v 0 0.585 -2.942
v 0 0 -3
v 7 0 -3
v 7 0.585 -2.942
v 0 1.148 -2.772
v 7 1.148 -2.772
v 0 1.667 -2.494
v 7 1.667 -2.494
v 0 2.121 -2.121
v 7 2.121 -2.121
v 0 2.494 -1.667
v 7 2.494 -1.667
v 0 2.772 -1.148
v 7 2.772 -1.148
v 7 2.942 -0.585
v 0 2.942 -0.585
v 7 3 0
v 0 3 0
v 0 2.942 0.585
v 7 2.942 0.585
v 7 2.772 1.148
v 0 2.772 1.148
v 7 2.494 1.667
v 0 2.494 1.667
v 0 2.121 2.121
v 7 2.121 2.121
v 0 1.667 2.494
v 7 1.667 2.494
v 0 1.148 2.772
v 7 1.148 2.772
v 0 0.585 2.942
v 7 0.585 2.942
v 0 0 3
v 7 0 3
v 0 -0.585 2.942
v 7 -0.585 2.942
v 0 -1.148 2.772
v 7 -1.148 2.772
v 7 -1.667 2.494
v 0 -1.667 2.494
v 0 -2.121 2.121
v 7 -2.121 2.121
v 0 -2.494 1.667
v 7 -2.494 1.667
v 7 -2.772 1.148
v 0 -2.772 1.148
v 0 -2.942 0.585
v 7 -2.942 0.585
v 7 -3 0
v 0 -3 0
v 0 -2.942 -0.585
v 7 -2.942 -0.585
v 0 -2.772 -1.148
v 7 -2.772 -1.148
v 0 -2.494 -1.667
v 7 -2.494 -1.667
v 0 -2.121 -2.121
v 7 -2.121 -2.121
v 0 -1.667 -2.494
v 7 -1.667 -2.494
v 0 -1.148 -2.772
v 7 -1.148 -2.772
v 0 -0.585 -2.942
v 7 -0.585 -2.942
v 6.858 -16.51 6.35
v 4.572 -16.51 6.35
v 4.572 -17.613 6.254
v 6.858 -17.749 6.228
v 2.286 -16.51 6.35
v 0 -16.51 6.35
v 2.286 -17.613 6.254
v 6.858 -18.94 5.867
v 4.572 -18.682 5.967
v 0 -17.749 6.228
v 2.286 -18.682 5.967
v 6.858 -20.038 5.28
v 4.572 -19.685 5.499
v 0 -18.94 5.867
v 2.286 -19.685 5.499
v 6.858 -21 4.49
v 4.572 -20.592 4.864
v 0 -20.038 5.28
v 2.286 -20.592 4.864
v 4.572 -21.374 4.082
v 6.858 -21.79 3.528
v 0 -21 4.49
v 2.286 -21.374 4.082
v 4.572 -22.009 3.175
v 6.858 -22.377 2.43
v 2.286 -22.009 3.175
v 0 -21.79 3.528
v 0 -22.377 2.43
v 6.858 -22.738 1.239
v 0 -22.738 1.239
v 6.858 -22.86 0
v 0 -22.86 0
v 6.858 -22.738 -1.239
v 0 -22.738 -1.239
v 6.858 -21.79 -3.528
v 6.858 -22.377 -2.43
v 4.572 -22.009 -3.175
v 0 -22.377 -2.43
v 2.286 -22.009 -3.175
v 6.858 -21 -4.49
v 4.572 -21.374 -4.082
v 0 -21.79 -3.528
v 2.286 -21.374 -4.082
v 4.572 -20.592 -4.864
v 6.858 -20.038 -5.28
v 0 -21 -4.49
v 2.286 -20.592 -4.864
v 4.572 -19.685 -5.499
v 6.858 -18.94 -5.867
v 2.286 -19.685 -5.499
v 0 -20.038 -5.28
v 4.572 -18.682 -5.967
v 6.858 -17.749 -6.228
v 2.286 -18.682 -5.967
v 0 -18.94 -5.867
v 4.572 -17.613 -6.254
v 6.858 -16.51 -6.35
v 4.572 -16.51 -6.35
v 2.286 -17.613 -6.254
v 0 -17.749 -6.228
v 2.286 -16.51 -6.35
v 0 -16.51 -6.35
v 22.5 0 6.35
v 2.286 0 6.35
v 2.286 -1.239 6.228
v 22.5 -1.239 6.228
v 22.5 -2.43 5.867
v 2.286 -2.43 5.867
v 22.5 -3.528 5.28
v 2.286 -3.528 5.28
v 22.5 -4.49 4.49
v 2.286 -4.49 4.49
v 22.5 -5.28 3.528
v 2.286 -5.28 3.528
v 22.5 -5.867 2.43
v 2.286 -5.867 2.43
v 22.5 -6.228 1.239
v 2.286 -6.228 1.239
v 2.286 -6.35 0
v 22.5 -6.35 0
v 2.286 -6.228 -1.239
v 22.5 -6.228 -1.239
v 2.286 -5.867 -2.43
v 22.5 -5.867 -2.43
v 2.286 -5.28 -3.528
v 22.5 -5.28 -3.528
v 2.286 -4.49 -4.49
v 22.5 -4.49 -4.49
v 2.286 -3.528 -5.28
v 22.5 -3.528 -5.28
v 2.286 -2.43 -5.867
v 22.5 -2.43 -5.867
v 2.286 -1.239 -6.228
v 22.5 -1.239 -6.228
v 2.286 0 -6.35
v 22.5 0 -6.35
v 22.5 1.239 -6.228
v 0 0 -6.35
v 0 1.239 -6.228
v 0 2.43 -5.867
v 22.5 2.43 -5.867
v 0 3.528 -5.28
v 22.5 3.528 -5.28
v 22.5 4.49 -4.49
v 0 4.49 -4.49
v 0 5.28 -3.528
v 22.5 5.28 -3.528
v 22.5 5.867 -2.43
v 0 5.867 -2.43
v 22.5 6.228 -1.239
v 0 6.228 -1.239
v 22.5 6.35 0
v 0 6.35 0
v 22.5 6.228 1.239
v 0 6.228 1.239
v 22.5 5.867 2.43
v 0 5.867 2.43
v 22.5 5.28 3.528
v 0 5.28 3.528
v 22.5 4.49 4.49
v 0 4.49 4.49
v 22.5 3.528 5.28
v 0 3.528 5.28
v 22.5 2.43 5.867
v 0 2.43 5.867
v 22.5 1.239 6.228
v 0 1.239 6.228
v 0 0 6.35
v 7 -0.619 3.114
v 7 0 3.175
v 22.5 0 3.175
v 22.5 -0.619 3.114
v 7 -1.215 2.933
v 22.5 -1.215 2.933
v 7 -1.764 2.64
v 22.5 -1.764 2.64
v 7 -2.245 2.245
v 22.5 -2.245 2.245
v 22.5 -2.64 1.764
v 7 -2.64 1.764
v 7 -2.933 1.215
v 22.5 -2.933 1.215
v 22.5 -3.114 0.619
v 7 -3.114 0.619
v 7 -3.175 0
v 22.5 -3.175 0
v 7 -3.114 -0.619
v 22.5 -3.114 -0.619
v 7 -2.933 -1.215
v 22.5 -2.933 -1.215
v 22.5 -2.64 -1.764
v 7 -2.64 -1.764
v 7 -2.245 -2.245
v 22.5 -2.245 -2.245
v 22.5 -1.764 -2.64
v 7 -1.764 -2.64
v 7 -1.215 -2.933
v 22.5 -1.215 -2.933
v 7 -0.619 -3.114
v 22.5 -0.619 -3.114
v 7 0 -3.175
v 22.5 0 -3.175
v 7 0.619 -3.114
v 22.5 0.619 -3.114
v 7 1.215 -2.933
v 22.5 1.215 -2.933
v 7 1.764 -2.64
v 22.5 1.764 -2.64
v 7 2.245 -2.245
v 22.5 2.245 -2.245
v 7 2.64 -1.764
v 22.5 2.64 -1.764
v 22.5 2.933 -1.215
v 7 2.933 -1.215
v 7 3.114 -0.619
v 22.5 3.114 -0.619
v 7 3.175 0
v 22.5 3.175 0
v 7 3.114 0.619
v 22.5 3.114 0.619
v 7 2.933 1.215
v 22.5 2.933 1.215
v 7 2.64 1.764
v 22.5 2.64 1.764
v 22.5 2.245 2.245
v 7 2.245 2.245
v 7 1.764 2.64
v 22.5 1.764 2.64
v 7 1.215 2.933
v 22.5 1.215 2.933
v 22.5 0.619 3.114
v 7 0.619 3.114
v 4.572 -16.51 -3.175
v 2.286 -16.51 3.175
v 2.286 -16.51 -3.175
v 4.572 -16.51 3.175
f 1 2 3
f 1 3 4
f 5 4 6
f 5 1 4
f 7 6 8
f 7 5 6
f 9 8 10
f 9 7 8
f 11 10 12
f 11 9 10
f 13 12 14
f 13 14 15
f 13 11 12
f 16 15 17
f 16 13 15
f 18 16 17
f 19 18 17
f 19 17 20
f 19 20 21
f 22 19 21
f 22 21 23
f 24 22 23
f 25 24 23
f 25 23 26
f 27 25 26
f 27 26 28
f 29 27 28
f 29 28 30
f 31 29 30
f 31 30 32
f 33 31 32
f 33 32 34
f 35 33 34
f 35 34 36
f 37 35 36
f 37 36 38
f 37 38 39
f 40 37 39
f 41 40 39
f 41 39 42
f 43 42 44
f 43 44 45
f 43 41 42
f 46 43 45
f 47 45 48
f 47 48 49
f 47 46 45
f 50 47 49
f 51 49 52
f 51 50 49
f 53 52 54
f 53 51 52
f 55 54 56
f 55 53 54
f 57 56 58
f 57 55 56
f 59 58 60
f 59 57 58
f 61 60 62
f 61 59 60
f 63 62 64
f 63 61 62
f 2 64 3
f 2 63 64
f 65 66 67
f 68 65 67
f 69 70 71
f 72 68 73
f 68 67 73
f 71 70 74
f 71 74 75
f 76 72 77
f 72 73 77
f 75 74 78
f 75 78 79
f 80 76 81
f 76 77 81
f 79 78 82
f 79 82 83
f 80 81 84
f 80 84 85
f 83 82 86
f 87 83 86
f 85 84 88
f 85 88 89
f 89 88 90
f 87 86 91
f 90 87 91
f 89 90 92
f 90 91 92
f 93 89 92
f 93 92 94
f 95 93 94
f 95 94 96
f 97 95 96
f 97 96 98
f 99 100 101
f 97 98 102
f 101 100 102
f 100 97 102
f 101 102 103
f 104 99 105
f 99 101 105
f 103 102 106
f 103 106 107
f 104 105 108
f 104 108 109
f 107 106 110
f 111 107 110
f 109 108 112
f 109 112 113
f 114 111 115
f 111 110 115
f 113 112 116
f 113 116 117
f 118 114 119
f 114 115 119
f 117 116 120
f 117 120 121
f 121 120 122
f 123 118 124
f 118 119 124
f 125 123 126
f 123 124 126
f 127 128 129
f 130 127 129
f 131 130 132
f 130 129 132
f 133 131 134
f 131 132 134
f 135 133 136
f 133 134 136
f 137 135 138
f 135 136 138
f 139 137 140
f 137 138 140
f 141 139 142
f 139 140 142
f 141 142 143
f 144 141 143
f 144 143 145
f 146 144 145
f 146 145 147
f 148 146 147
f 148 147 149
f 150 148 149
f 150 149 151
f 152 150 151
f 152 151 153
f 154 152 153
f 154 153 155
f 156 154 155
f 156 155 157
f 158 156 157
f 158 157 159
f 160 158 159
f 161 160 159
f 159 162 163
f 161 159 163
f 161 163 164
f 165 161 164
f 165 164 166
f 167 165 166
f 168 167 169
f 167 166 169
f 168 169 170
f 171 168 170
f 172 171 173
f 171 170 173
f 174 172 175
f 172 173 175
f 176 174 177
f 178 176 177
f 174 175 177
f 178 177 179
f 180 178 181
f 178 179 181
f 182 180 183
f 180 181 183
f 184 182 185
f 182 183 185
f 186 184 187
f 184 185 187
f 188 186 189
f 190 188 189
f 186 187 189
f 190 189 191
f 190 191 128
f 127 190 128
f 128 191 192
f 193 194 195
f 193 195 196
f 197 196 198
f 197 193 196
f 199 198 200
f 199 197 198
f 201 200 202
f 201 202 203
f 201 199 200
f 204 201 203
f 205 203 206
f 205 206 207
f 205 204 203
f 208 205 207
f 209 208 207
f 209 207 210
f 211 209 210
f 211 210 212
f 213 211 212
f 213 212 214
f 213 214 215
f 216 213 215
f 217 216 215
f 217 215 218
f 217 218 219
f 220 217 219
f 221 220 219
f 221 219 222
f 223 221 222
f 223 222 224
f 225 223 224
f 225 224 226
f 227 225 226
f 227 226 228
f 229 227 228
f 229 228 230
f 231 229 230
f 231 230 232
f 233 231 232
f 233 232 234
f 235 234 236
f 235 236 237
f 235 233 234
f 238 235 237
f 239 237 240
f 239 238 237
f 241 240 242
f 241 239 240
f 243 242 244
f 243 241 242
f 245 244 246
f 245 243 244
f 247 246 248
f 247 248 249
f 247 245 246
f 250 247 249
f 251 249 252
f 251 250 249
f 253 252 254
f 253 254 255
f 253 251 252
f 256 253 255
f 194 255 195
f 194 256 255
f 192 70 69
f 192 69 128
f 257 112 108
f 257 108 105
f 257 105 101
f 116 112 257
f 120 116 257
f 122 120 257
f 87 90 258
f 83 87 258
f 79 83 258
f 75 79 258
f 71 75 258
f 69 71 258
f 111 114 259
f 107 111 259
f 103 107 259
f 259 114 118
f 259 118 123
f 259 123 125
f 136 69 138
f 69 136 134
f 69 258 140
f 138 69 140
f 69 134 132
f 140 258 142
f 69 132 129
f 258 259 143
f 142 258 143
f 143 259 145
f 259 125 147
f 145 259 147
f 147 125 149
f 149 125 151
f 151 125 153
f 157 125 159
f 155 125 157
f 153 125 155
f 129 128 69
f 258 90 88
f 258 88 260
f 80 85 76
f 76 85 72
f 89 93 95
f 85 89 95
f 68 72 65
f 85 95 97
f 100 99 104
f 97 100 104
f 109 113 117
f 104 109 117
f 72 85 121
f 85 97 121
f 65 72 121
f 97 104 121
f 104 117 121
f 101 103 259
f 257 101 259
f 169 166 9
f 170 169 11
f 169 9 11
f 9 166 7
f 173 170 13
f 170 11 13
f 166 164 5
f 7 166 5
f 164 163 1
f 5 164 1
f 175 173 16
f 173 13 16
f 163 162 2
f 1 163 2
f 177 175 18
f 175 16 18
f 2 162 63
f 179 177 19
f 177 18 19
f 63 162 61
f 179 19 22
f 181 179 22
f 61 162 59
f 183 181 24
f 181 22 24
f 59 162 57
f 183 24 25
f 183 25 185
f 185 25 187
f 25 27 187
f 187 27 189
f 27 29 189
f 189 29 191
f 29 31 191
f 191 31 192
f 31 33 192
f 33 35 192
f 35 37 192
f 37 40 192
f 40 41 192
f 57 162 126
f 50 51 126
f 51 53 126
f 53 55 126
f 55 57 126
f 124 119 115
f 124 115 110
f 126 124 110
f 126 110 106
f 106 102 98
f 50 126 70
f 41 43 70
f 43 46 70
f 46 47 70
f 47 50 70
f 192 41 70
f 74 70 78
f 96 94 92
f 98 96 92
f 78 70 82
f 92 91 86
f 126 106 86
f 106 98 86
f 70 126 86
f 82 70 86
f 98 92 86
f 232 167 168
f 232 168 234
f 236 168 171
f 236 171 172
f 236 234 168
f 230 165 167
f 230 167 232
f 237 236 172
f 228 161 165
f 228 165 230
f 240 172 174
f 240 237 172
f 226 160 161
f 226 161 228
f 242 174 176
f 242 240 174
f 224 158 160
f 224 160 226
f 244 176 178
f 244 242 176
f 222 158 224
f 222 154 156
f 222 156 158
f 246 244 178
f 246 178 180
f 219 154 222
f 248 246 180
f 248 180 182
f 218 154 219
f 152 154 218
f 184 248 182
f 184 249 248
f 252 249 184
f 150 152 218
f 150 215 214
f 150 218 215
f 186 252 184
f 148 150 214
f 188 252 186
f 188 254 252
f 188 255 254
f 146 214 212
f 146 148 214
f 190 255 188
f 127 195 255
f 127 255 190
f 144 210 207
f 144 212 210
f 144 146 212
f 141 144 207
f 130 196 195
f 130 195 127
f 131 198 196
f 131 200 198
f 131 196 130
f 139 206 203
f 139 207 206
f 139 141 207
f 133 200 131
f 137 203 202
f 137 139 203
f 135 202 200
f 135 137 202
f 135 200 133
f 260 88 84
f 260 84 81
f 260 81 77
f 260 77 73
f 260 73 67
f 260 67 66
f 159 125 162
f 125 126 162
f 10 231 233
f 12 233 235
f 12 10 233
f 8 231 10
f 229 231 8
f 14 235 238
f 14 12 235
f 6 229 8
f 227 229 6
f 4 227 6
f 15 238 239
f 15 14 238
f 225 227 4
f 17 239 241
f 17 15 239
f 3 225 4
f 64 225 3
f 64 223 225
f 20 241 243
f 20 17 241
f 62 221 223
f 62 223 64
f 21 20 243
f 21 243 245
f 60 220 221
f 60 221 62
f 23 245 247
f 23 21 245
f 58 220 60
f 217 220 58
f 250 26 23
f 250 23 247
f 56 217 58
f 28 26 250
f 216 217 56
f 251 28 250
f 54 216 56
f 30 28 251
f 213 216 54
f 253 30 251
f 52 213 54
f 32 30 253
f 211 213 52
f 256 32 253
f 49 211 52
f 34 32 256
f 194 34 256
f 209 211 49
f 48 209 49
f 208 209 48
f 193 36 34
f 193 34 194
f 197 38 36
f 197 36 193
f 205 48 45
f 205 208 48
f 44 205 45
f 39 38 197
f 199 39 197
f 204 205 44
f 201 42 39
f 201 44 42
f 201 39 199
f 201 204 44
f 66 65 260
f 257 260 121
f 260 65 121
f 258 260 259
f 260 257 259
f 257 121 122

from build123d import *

# Parameters (mm, degrees)
SKETCH1_R                = 6.35
SKETCH1_R_2              = 3.175
BOSS_EXTRUDE1_DEPTH      = 22.5
SKETCH1_3_R              = 3.175
SKETCH1_3_R_2            = 3
BOSS_EXTRUDE2_DEPTH      = 7
BOSS_EXTRUDE3_DEPTH      = 6.35
BOSS_EXTRUDE3_DEPTH_BACK = 6.35
SKETCH3_W                = 6.35
SKETCH3_H                = 2.286
BOSS_EXTRUDE4_DEPTH      = 3.175
BOSS_EXTRUDE4_DEPTH_BACK = 3.175
SKETCH3_4_W              = 6.35
SKETCH3_4_H              = 2.286
SKETCH1_4_R              = 3
CUT_EXTRUDE2_DEPTH       = 33.697891369
FILLET1_R                = 6.35


with BuildPart() as part:
    # Sketch1 → Boss-Extrude1 (new body)
    with BuildSketch(Plane.YZ):
        with Locations(Location((0, 0, 0), (0, 0, 90))):
            Circle(SKETCH1_R)
        with Locations(Location((0, 0, 0), (0, 0, 90))):
            Circle(SKETCH1_R_2, mode=Mode.SUBTRACT)
    extrude(amount=BOSS_EXTRUDE1_DEPTH)

    # Sketch1<3> → Boss-Extrude2 (add)
    with BuildSketch(Plane.YZ):
        with Locations(Location((0, 0, 0), (0, 0, 90))):
            Circle(SKETCH1_3_R)
        with Locations(Location((0, 0, 0), (0, 0, 270))):
            Circle(SKETCH1_3_R_2, mode=Mode.SUBTRACT)
    extrude(amount=BOSS_EXTRUDE2_DEPTH)

    # Sketch3 → Boss-Extrude3 (add, two sides: drawn at the far end of the back side and taken through both)
    with BuildSketch(Plane(origin=(0, 0, 0), x_dir=(0, 1, 0), z_dir=(0, 0, 1)).offset(-BOSS_EXTRUDE3_DEPTH_BACK)):
        Polygon((0, -2.286), (0, 0), (-22.86, 0), (-22.86, -2.286), (-16.51, -2.286), align=None)
        with Locations((-19.685, -5.715)):
            Rectangle(SKETCH3_W, SKETCH3_H)
    extrude(amount=BOSS_EXTRUDE3_DEPTH + BOSS_EXTRUDE3_DEPTH_BACK)


with BuildPart() as boss_extrude3_piece_1:
    # of the separate pieces the step leaves, piece 1, a body of its own (boss_extrude3_pieces)
    add(part.part.solids().sort_by_distance((0, 0, -6.35))[0])



with BuildPart() as boss_extrude3_piece_2:
    # of the separate pieces the step leaves, piece 2, a body of its own (boss_extrude3_pieces)
    add(part.part.solids().sort_by_distance((4.572, -16.51, 6.35))[0])


with BuildPart() as boss_extrude3_piece_1_1:
    add(boss_extrude3_piece_1.part)

    add(boss_extrude3_piece_2.part)  # Boss-Extrude4 merges Boss-Extrude3 piece 2
    # Sketch3<4> → Boss-Extrude4 (add, two sides: drawn at the far end of the back side and taken through both)
    with BuildSketch(Plane(origin=(0, 0, 0), x_dir=(0, 1, 0), z_dir=(0, 0, 1)).offset(-BOSS_EXTRUDE4_DEPTH_BACK)):
        with Locations((-19.685, -3.429)):
            Rectangle(SKETCH3_4_W, SKETCH3_4_H)
    extrude(amount=BOSS_EXTRUDE4_DEPTH + BOSS_EXTRUDE4_DEPTH_BACK)

    # Sketch1<4> → Cut-Extrude2 (cut, through all)
    with BuildSketch(Plane.YZ):
        with Locations(Location((0, 0, 0), (0, 0, 270))):
            Circle(SKETCH1_4_R)
    extrude(amount=CUT_EXTRUDE2_DEPTH, mode=Mode.SUBTRACT)

    # Fillet1
    # the kernel refuses this fillet: 6.35 mm, written as the material it takes off along each edge
    with BuildSketch(Plane(origin=(-15.875, -22.86, -6.35), x_dir=(0, 1, 0), z_dir=(1, 0, 0))) as fillet1_piece_1:
        with BuildLine():
            CenterArc((FILLET1_R, FILLET1_R), FILLET1_R, 180, 90)
            Line((0, FILLET1_R), (0, 0))
            Line((0, 0), (FILLET1_R, 0))
        make_face()
    extrude(amount=34.036, mode=Mode.SUBTRACT)
    with BuildSketch(Plane(origin=(-15.875, -22.86, 6.35), x_dir=(0, 1, 0), z_dir=(1, 0, 0))) as fillet1_piece_2:
        with BuildLine():
            CenterArc((FILLET1_R, -FILLET1_R), FILLET1_R, 90, 90)
            Line((0, -FILLET1_R), (0, 0))
            Line((0, 0), (FILLET1_R, 0))
        make_face()
    extrude(amount=34.036, mode=Mode.SUBTRACT)


solid = boss_extrude3_piece_1_1.part
